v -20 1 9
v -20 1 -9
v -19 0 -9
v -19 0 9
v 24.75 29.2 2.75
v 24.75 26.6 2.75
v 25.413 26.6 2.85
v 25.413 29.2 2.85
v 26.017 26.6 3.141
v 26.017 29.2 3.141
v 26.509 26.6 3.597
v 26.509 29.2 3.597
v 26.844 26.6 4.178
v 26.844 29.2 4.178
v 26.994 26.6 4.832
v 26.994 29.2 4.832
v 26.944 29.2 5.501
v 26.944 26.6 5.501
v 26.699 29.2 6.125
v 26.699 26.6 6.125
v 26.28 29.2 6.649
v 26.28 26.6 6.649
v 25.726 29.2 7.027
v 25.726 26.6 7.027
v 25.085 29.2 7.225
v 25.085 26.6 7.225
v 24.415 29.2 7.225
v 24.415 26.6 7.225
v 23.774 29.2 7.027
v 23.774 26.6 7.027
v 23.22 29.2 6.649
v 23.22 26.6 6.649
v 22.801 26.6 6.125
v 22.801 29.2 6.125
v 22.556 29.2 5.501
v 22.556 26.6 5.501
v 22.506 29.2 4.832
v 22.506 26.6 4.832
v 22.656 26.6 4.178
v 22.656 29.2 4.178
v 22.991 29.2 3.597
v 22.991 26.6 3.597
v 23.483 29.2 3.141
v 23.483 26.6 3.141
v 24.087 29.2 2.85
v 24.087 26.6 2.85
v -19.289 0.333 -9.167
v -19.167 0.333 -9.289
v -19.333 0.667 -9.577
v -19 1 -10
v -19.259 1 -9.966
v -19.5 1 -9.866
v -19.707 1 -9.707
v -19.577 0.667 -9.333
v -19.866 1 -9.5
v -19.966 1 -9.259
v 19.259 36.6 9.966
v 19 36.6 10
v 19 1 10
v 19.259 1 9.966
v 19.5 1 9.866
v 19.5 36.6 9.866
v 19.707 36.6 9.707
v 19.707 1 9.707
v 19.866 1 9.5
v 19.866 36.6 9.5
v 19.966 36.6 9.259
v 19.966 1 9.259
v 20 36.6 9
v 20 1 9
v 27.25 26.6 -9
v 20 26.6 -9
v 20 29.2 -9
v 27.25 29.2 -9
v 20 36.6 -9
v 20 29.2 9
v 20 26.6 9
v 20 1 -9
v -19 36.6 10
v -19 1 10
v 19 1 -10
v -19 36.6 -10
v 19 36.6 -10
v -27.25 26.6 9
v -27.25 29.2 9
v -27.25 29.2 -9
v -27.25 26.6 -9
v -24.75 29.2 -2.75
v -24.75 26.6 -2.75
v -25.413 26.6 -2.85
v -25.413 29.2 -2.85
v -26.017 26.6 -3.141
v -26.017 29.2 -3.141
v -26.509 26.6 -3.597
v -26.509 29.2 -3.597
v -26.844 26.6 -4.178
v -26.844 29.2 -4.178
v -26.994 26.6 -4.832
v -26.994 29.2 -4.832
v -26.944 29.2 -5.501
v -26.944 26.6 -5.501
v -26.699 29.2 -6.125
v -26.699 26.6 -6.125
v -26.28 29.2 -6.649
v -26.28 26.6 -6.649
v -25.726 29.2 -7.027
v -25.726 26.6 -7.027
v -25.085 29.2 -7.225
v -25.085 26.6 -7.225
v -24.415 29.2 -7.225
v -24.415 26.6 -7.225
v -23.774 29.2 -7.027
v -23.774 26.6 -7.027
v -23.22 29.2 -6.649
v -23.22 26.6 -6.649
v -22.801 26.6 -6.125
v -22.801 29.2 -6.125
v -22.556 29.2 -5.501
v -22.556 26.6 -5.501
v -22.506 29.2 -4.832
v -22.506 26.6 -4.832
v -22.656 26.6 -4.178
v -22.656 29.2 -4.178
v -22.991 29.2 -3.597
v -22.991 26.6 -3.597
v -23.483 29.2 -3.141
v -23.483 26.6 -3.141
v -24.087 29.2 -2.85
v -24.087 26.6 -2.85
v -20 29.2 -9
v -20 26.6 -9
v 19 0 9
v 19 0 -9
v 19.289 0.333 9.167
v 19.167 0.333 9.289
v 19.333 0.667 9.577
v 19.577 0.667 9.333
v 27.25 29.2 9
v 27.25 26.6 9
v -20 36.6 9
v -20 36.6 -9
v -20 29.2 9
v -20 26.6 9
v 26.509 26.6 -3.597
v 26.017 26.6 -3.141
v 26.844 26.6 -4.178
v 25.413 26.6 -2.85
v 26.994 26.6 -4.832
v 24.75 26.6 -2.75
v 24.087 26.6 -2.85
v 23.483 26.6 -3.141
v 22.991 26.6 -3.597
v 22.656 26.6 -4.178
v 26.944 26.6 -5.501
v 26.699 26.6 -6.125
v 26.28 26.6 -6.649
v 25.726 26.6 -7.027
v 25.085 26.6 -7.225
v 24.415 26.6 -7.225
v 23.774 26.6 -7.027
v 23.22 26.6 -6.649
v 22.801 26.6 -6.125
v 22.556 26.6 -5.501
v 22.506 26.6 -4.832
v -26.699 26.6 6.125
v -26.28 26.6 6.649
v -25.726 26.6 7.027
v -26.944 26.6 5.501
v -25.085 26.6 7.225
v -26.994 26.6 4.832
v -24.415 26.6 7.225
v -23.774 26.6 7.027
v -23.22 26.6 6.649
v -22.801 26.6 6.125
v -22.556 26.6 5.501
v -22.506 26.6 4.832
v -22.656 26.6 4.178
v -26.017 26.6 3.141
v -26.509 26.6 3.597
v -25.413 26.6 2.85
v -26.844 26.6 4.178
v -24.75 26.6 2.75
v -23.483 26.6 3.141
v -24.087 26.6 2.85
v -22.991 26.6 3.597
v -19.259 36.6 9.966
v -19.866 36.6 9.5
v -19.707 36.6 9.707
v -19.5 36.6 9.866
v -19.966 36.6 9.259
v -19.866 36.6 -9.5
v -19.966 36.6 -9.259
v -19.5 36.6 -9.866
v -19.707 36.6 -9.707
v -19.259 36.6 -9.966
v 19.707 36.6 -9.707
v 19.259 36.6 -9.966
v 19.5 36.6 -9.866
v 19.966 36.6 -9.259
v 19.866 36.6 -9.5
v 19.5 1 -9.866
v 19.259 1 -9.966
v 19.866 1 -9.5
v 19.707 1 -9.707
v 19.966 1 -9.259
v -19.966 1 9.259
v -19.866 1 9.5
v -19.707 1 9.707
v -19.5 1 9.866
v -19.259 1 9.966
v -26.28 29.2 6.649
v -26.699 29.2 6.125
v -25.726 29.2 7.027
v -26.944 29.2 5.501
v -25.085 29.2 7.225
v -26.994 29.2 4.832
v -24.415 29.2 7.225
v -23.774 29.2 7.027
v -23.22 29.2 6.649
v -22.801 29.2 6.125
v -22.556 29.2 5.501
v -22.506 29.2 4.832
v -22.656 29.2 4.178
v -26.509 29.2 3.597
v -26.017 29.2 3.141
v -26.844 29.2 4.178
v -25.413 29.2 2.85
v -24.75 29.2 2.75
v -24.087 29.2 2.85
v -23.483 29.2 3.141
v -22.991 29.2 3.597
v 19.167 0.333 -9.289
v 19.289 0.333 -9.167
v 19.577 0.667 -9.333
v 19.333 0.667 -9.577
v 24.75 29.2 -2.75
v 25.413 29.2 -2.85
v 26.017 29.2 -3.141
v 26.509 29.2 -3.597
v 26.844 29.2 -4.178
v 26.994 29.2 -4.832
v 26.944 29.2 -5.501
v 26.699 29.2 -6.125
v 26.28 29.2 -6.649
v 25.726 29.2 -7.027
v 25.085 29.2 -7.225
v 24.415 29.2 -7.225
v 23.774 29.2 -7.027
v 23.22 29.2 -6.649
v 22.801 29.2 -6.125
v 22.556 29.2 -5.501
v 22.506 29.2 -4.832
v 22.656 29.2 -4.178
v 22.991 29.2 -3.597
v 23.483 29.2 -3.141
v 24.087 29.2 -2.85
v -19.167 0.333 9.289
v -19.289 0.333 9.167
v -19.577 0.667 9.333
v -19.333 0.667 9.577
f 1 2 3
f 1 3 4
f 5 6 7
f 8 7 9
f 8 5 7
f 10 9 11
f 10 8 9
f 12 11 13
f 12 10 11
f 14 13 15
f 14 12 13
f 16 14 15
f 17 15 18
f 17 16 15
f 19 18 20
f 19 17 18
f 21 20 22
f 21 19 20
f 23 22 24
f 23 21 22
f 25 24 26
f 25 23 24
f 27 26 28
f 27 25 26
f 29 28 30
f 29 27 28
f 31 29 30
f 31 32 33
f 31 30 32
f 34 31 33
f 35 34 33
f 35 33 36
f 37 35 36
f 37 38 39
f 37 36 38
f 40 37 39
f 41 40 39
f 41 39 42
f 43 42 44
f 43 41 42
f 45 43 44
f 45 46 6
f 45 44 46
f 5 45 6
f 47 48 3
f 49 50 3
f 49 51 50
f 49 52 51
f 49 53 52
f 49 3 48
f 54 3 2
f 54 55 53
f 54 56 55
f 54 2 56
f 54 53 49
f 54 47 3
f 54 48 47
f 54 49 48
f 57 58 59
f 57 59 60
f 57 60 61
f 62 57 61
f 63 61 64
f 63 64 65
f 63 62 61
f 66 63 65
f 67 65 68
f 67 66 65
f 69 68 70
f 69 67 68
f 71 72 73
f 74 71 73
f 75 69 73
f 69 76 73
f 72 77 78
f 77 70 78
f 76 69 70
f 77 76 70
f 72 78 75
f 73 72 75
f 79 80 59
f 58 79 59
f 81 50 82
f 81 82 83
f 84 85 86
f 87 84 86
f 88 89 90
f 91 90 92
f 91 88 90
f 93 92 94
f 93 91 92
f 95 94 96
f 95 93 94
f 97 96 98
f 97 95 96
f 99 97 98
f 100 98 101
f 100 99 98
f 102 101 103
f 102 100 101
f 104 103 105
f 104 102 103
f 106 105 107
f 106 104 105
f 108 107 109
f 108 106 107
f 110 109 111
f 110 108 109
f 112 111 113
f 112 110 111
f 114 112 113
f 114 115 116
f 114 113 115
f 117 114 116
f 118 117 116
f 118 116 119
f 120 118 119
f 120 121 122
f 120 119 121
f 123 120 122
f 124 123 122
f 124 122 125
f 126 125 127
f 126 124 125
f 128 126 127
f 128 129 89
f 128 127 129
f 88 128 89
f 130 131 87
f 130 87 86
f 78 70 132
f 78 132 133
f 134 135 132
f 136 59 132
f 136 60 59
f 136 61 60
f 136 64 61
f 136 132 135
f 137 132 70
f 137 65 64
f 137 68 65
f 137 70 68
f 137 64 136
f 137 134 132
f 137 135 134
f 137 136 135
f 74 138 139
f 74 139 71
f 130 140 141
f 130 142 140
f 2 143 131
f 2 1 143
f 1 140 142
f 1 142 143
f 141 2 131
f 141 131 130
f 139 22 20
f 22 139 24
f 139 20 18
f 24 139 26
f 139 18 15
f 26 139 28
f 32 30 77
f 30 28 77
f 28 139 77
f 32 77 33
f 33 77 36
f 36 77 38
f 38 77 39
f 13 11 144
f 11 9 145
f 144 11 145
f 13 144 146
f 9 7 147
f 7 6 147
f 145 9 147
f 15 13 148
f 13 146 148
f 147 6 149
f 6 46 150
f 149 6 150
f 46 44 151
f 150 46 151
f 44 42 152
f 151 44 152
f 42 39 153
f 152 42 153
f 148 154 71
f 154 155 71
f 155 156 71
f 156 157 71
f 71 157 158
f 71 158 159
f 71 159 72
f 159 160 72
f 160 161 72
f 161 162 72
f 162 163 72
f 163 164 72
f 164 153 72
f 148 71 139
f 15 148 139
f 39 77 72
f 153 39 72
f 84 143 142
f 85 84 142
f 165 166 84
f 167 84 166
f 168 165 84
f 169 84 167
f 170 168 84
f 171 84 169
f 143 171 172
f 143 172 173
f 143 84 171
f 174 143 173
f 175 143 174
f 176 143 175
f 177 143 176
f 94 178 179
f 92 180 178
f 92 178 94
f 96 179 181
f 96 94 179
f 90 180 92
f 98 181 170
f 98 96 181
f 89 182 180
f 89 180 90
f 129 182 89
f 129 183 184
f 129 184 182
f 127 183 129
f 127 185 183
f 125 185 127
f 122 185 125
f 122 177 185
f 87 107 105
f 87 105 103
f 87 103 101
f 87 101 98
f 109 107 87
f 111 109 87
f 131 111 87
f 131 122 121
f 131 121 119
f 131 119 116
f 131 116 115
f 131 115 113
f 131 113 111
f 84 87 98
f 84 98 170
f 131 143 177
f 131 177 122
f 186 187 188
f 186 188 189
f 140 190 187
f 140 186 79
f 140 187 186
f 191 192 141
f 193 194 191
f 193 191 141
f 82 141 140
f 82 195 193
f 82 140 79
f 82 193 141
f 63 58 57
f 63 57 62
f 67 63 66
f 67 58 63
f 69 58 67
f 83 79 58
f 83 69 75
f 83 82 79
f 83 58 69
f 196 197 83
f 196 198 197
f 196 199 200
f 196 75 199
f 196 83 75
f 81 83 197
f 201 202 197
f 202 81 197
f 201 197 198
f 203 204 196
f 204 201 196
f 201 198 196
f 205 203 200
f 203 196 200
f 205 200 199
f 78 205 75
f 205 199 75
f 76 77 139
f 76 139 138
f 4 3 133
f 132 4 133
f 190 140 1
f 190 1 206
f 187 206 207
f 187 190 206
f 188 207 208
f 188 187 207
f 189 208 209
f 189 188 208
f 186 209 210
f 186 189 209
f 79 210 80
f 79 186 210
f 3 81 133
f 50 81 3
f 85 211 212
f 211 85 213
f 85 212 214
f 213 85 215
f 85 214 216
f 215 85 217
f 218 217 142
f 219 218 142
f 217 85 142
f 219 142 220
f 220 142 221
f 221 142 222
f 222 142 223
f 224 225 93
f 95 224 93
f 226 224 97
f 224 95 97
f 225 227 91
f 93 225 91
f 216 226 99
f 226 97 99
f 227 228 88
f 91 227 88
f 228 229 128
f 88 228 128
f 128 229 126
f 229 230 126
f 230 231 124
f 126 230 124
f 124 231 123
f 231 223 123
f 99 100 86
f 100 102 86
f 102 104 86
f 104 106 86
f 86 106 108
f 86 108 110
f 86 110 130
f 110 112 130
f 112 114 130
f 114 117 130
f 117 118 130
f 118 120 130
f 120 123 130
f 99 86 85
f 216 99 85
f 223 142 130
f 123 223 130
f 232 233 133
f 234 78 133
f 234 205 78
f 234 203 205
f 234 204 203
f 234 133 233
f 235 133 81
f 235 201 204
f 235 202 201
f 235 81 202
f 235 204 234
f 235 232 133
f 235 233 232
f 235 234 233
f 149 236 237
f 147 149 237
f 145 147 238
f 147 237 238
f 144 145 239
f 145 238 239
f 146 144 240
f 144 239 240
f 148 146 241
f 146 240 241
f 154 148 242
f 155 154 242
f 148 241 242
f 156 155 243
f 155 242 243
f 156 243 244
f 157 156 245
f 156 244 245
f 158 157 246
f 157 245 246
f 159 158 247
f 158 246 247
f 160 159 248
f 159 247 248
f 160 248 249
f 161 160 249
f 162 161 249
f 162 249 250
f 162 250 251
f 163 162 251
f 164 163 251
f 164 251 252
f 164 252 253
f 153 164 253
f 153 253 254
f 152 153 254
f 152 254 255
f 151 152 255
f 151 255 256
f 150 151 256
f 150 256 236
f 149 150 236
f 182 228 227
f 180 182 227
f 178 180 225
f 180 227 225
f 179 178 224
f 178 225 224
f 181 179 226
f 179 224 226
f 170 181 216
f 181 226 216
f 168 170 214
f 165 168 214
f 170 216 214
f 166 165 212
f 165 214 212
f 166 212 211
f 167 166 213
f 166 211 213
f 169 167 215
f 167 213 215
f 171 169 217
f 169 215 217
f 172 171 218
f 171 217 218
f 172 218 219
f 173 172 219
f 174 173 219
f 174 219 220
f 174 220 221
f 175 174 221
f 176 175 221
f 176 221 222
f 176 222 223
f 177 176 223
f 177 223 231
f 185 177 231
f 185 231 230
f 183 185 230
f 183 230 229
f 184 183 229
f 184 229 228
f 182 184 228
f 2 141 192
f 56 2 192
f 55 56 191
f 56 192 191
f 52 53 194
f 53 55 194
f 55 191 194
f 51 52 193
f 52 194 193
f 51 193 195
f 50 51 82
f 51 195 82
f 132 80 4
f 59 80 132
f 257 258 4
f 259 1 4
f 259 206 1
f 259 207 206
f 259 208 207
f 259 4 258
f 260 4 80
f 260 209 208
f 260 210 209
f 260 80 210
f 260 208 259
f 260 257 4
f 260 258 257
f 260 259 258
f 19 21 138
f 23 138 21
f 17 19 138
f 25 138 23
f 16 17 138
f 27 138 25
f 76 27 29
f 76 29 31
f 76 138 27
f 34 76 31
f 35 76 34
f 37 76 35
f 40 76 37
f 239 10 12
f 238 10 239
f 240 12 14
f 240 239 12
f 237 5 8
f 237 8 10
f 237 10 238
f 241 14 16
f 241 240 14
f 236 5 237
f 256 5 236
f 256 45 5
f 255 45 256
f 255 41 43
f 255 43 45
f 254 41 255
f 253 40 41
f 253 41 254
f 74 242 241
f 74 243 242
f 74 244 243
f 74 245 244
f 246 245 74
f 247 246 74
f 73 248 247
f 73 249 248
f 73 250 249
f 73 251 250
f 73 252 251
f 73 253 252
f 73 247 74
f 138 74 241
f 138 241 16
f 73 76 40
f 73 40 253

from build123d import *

# Parameters (mm, degrees)
SKETCH1_W               = 40
SKETCH1_H               = 20
BOSS_EXTRUDE1_DEPTH     = 36.6
SKETCH2_W               = 18
SKETCH2_H               = 2.6
BOSS_EXTRUDE2_DEPTH     = 7.25
SKETCH3_R               = 2.25
CUT_EXTRUDE1_DEPTH      = 42.17283692
MIRROR3_COPY_1_SKETCH_R = 2.25
MIRROR3_COPY_1_DEPTH    = 42.17283692
FILLET1_R               = 1
CHAMFER1_SIZE           = 1


with BuildPart() as part:
    # Sketch1 → Boss-Extrude1 (new body)
    with BuildSketch(Plane(origin=(0, 0, 0), x_dir=(1, 0, 0), z_dir=(0, 1, 0))):
        Rectangle(SKETCH1_W, SKETCH1_H)
    extrude(amount=BOSS_EXTRUDE1_DEPTH)

    # Sketch2 → Boss-Extrude2 (add)
    with BuildSketch(Plane(origin=(20, 0, 0), x_dir=(0, 0, -1), z_dir=(1, 0, 0))):
        with Locations((0, 27.9)):
            Rectangle(SKETCH2_W, SKETCH2_H)
    boss_extrude2 = extrude(amount=BOSS_EXTRUDE2_DEPTH)

    # Sketch3 → Cut-Extrude1 (cut, through all)
    with BuildSketch(Plane(origin=(0, 29.2, 0), x_dir=(1, 0, 0), z_dir=(0, 1, 0))):
        with Locations(Location((24.75, 5, 0), (0, 0, 270))):
            Circle(SKETCH3_R)
    cut_extrude1 = extrude(amount=-CUT_EXTRUDE1_DEPTH, mode=Mode.SUBTRACT)

    # Mirror2: Cut-Extrude1 across plane
    add(cut_extrude1.mirror(Plane.XY), mode=Mode.SUBTRACT)

    # Mirror3: Boss-Extrude2, Cut-Extrude1 across plane
    add(boss_extrude2.mirror(Plane(origin=(0, 0, 0), x_dir=(0, 0, 1), z_dir=(1, 0, 0))))
    add(cut_extrude1.mirror(Plane(origin=(0, 0, 0), x_dir=(0, 0, 1), z_dir=(1, 0, 0))), mode=Mode.SUBTRACT)

    # Mirror3 copy 1 sketch → Mirror3 copy 1 (cut, through all)
    with BuildSketch(Plane(origin=(0, 29.2, 0), x_dir=(-1, 0, 0), z_dir=(0, 1, 0))):
        with Locations(Location((24.75, 5, 0), (0, 0, 270))):
            Circle(MIRROR3_COPY_1_SKETCH_R)
    extrude(amount=-MIRROR3_COPY_1_DEPTH, mode=Mode.SUBTRACT)

    # Fillet1
    fillet1_edges = [part.edges().sort_by_distance(p)[0] for p in [
        (20, 18.3, 10),
        (-20, 18.3, 10),
        (-20, 18.3, -10),
        (20, 18.3, -10),
    ]]
    fillet(fillet1_edges, radius=FILLET1_R - 0.0001)  # a hair under: the kernel refuses the full size

    # Chamfer1
    chamfer1_edges = [part.edges().sort_by_distance(p)[0] for p in [
        (20, 0, 0),
        (0, 0, 10),
        (-20, 0, 0),
        (0, 0, -10),
        (-19.707136071, 0, 9.707136071),
        (-19.707136071, 0, -9.707136071),
        (19.707136071, 0, -9.707136071),
        (19.707136071, 0, 9.707136071),
    ]]
    chamfer(chamfer1_edges, length=CHAMFER1_SIZE - 0.0001)  # a hair under: the kernel refuses the full size


solid = part.part
